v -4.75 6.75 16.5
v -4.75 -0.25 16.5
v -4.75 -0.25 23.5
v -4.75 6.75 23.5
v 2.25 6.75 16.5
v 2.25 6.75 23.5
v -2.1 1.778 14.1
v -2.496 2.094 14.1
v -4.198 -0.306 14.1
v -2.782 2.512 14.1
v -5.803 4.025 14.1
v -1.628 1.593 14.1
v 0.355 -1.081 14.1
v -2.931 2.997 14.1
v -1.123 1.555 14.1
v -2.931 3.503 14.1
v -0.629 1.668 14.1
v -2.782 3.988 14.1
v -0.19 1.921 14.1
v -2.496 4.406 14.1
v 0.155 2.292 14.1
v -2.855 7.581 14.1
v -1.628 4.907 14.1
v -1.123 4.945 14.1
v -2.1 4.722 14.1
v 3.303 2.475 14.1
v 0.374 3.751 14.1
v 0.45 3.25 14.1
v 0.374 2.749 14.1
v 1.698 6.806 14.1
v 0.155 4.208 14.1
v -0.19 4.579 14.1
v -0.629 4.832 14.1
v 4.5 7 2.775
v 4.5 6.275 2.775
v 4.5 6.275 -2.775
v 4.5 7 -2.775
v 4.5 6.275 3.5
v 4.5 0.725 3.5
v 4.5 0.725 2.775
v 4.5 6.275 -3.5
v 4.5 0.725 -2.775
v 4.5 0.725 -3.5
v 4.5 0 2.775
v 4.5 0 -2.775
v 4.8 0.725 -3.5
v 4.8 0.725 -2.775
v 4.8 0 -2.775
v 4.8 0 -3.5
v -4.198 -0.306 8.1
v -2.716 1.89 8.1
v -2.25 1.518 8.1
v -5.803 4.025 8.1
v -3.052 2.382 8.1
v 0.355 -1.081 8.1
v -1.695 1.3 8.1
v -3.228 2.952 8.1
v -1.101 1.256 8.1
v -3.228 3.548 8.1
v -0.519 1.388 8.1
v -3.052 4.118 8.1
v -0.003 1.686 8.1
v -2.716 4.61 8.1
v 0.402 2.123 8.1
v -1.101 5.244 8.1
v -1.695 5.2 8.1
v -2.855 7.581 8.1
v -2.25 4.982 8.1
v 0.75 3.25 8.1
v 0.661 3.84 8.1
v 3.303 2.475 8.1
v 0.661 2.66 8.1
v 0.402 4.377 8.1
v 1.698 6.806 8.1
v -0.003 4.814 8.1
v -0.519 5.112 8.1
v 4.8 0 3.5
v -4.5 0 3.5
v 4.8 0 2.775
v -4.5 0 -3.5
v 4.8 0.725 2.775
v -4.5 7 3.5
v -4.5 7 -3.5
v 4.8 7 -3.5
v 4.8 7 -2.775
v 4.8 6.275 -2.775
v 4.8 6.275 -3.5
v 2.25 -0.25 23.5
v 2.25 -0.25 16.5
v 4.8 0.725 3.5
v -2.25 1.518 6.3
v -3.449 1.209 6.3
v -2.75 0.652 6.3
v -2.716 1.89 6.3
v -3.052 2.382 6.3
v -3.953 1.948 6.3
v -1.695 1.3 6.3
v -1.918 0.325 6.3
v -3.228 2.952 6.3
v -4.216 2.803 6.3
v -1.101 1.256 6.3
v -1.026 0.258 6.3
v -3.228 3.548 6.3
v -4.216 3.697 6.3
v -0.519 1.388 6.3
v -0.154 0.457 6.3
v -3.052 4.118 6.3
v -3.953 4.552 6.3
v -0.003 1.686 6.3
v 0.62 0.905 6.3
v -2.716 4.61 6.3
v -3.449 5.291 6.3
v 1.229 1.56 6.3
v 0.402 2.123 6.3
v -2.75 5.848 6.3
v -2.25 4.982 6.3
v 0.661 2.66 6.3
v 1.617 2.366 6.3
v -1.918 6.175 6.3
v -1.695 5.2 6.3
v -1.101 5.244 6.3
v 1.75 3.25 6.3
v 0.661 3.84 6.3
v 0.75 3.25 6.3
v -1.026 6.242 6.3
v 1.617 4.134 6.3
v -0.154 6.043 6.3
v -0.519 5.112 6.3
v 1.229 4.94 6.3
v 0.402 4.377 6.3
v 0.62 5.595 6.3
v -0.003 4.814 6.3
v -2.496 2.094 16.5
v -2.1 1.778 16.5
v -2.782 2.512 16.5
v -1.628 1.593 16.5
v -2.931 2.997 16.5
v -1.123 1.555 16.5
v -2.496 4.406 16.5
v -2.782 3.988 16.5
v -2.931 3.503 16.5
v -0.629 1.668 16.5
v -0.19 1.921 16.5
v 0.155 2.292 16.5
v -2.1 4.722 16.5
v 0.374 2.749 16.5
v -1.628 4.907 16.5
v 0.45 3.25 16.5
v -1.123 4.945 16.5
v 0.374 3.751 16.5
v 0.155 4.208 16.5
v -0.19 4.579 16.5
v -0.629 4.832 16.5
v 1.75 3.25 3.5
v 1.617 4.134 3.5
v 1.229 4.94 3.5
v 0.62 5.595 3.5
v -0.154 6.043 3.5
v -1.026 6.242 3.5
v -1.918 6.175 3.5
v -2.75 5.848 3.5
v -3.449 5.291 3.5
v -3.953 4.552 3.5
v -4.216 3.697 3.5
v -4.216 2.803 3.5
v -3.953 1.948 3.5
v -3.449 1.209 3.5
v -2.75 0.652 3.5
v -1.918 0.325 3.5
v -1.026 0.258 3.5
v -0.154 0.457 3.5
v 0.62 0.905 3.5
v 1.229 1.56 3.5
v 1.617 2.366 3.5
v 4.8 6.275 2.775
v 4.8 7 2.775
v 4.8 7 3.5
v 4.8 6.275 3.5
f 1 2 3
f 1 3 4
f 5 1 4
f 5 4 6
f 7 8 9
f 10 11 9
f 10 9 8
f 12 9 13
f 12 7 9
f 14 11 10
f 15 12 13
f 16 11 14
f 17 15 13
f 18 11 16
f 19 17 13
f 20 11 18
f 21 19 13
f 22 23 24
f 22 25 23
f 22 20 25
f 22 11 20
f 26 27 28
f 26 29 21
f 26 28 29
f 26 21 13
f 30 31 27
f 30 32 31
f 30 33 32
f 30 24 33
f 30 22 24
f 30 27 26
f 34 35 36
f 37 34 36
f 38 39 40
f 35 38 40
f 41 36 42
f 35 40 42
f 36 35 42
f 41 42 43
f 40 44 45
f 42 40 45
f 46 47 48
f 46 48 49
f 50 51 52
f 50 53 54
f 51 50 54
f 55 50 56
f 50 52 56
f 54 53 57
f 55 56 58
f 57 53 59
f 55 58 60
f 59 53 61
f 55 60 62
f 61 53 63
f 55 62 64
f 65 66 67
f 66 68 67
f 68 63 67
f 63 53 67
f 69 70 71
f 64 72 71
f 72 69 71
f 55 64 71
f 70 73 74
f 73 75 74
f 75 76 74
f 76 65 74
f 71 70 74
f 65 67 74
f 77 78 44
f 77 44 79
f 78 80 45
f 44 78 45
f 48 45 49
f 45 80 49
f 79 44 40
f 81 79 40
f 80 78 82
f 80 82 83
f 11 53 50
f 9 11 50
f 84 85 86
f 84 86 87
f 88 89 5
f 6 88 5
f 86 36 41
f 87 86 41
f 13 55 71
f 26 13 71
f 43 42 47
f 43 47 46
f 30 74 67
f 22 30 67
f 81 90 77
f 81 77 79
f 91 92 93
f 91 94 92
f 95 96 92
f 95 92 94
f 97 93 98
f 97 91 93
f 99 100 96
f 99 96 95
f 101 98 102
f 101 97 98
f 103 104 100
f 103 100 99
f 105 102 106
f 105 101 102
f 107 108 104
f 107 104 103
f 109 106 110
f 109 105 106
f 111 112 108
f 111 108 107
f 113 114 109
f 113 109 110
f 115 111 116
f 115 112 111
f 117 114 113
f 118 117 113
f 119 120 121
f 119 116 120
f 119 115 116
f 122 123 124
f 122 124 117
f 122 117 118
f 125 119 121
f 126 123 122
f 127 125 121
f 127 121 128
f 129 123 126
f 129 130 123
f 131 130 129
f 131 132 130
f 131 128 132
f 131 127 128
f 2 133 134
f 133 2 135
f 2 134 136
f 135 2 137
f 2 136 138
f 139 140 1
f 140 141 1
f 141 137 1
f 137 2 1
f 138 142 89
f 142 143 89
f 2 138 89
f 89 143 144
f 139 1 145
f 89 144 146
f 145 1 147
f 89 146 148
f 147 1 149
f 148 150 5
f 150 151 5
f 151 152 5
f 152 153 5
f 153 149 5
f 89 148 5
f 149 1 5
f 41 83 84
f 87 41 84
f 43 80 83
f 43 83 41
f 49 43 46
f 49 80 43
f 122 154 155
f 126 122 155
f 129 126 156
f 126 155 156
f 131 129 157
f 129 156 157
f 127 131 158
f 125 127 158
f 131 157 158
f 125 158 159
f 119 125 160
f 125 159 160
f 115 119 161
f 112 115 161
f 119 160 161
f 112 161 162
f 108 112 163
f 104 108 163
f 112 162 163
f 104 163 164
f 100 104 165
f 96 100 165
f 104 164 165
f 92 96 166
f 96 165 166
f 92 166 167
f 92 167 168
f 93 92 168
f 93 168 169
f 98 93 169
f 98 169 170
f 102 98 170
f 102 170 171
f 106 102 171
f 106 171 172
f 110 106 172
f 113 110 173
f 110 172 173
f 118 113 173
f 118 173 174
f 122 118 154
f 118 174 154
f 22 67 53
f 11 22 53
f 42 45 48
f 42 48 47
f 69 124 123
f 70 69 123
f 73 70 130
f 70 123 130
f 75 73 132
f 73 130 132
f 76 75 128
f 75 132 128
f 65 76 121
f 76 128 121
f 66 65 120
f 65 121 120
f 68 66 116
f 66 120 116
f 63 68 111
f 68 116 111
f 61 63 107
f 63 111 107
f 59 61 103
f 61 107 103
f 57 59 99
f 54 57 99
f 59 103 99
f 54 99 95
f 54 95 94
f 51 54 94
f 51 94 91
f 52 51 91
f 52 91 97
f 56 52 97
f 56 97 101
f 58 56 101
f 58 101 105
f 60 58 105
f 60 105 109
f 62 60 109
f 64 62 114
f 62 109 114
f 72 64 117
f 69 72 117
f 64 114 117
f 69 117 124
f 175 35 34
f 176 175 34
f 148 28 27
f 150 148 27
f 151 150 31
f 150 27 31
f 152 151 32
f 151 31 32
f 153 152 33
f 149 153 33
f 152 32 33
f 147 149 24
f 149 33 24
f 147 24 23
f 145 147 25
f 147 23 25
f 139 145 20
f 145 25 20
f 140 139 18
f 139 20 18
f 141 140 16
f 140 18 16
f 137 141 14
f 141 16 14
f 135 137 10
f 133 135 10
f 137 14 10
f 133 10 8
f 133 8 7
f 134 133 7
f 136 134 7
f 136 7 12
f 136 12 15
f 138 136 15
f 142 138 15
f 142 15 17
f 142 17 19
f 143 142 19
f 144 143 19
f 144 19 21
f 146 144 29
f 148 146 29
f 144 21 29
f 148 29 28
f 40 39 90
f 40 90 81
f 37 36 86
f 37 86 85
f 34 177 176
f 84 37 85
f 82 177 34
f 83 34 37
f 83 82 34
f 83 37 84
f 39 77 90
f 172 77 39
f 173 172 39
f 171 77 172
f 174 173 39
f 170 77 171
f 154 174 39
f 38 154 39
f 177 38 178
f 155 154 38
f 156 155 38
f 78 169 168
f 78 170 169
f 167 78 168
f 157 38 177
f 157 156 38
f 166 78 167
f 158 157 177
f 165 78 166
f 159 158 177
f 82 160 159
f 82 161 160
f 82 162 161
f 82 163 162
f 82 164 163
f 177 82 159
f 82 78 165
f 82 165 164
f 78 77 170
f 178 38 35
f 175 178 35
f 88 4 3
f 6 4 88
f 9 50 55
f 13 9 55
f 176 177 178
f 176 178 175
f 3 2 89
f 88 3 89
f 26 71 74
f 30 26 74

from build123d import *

# Parameters (mm, degrees)
SKETCH1_W           = 9
SKETCH1_H           = 7
BOSS_EXTRUDE1_DEPTH = 7
SKETCH4_W           = 0.725
SKETCH4_H           = 0.725
BOSS_EXTRUDE3_DEPTH = 0.3
SKETCH_1_R          = 3
EXTRUDE_1_DEPTH     = 2.8
SKETCH_2_R          = 2
EXTRUDE_2_DEPTH     = 1.8
EXTRUDE_3_DEPTH     = 6
SKETCH_4_R          = 1.7
EXTRUDE_4_DEPTH     = 2.4
SKETCH_5_W          = 7
SKETCH_5_H          = 7
EXTRUDE_5_DEPTH     = 7


with BuildPart() as part:
    # Sketch1 → Boss-Extrude1 (new body)
    with BuildSketch(Plane(origin=(0, 0, 0), x_dir=(1, 0, 0), z_dir=(0, 1, 0))):
        Rectangle(SKETCH1_W, SKETCH1_H)
    extrude(amount=BOSS_EXTRUDE1_DEPTH)

    # Sketch4 → Boss-Extrude3 (add)
    with BuildSketch(Plane(origin=(4.5, 0, 0), x_dir=(0, 0, -1), z_dir=(1, 0, 0))):
        with Locations((-3.1375, 6.6375)):
            Rectangle(SKETCH4_W, SKETCH4_H)
        with Locations((3.1375, 6.6375)):
            Rectangle(SKETCH4_W, SKETCH4_H)
        with Locations((-3.1375, 0.3625)):
            Rectangle(SKETCH4_W, SKETCH4_H)
        with Locations((3.1375, 0.3625)):
            Rectangle(SKETCH4_W, SKETCH4_H)
    extrude(amount=BOSS_EXTRUDE3_DEPTH)

    # ｽｹｯﾁ1 → ﾎﾞｽ - 押し出し1 (add)
    with BuildSketch(Plane.XY.offset(3.5)):
        with Locations((-1.25, 3.25)):
            Circle(SKETCH_1_R)
    extrude(amount=EXTRUDE_1_DEPTH)

    # ｽｹｯﾁ2 → ﾎﾞｽ - 押し出し2 (add)
    with BuildSketch(Plane.XY.offset(6.3)):
        with Locations((-1.25, 3.25)):
            Circle(SKETCH_2_R)
    extrude(amount=EXTRUDE_2_DEPTH)

    # ｽｹｯﾁ3 → ﾎﾞｽ - 押し出し3 (add)
    with BuildSketch(Plane.XY.offset(8.1)):
        Polygon((1.697866371, 6.805758315), (-2.855443845, 7.580806321), (-5.803310216, 4.025048007), (-4.197866371, -0.305758315), (0.355443845, -1.080806321), (3.303310216, 2.474951993), align=None)
    extrude(amount=EXTRUDE_3_DEPTH)

    # ｽｹｯﾁ4 → ﾎﾞｽ - 押し出し4 (add)
    with BuildSketch(Plane.XY.offset(14.1)):
        with Locations((-1.25, 3.25)):
            Circle(SKETCH_4_R)
    extrude(amount=EXTRUDE_4_DEPTH)

    # ｽｹｯﾁ5 → ﾎﾞｽ - 押し出し5 (add)
    with BuildSketch(Plane.XY.offset(16.5)):
        with Locations((-1.25, 3.25)):
            Rectangle(SKETCH_5_W, SKETCH_5_H)
    extrude(amount=EXTRUDE_5_DEPTH)


solid = part.part
